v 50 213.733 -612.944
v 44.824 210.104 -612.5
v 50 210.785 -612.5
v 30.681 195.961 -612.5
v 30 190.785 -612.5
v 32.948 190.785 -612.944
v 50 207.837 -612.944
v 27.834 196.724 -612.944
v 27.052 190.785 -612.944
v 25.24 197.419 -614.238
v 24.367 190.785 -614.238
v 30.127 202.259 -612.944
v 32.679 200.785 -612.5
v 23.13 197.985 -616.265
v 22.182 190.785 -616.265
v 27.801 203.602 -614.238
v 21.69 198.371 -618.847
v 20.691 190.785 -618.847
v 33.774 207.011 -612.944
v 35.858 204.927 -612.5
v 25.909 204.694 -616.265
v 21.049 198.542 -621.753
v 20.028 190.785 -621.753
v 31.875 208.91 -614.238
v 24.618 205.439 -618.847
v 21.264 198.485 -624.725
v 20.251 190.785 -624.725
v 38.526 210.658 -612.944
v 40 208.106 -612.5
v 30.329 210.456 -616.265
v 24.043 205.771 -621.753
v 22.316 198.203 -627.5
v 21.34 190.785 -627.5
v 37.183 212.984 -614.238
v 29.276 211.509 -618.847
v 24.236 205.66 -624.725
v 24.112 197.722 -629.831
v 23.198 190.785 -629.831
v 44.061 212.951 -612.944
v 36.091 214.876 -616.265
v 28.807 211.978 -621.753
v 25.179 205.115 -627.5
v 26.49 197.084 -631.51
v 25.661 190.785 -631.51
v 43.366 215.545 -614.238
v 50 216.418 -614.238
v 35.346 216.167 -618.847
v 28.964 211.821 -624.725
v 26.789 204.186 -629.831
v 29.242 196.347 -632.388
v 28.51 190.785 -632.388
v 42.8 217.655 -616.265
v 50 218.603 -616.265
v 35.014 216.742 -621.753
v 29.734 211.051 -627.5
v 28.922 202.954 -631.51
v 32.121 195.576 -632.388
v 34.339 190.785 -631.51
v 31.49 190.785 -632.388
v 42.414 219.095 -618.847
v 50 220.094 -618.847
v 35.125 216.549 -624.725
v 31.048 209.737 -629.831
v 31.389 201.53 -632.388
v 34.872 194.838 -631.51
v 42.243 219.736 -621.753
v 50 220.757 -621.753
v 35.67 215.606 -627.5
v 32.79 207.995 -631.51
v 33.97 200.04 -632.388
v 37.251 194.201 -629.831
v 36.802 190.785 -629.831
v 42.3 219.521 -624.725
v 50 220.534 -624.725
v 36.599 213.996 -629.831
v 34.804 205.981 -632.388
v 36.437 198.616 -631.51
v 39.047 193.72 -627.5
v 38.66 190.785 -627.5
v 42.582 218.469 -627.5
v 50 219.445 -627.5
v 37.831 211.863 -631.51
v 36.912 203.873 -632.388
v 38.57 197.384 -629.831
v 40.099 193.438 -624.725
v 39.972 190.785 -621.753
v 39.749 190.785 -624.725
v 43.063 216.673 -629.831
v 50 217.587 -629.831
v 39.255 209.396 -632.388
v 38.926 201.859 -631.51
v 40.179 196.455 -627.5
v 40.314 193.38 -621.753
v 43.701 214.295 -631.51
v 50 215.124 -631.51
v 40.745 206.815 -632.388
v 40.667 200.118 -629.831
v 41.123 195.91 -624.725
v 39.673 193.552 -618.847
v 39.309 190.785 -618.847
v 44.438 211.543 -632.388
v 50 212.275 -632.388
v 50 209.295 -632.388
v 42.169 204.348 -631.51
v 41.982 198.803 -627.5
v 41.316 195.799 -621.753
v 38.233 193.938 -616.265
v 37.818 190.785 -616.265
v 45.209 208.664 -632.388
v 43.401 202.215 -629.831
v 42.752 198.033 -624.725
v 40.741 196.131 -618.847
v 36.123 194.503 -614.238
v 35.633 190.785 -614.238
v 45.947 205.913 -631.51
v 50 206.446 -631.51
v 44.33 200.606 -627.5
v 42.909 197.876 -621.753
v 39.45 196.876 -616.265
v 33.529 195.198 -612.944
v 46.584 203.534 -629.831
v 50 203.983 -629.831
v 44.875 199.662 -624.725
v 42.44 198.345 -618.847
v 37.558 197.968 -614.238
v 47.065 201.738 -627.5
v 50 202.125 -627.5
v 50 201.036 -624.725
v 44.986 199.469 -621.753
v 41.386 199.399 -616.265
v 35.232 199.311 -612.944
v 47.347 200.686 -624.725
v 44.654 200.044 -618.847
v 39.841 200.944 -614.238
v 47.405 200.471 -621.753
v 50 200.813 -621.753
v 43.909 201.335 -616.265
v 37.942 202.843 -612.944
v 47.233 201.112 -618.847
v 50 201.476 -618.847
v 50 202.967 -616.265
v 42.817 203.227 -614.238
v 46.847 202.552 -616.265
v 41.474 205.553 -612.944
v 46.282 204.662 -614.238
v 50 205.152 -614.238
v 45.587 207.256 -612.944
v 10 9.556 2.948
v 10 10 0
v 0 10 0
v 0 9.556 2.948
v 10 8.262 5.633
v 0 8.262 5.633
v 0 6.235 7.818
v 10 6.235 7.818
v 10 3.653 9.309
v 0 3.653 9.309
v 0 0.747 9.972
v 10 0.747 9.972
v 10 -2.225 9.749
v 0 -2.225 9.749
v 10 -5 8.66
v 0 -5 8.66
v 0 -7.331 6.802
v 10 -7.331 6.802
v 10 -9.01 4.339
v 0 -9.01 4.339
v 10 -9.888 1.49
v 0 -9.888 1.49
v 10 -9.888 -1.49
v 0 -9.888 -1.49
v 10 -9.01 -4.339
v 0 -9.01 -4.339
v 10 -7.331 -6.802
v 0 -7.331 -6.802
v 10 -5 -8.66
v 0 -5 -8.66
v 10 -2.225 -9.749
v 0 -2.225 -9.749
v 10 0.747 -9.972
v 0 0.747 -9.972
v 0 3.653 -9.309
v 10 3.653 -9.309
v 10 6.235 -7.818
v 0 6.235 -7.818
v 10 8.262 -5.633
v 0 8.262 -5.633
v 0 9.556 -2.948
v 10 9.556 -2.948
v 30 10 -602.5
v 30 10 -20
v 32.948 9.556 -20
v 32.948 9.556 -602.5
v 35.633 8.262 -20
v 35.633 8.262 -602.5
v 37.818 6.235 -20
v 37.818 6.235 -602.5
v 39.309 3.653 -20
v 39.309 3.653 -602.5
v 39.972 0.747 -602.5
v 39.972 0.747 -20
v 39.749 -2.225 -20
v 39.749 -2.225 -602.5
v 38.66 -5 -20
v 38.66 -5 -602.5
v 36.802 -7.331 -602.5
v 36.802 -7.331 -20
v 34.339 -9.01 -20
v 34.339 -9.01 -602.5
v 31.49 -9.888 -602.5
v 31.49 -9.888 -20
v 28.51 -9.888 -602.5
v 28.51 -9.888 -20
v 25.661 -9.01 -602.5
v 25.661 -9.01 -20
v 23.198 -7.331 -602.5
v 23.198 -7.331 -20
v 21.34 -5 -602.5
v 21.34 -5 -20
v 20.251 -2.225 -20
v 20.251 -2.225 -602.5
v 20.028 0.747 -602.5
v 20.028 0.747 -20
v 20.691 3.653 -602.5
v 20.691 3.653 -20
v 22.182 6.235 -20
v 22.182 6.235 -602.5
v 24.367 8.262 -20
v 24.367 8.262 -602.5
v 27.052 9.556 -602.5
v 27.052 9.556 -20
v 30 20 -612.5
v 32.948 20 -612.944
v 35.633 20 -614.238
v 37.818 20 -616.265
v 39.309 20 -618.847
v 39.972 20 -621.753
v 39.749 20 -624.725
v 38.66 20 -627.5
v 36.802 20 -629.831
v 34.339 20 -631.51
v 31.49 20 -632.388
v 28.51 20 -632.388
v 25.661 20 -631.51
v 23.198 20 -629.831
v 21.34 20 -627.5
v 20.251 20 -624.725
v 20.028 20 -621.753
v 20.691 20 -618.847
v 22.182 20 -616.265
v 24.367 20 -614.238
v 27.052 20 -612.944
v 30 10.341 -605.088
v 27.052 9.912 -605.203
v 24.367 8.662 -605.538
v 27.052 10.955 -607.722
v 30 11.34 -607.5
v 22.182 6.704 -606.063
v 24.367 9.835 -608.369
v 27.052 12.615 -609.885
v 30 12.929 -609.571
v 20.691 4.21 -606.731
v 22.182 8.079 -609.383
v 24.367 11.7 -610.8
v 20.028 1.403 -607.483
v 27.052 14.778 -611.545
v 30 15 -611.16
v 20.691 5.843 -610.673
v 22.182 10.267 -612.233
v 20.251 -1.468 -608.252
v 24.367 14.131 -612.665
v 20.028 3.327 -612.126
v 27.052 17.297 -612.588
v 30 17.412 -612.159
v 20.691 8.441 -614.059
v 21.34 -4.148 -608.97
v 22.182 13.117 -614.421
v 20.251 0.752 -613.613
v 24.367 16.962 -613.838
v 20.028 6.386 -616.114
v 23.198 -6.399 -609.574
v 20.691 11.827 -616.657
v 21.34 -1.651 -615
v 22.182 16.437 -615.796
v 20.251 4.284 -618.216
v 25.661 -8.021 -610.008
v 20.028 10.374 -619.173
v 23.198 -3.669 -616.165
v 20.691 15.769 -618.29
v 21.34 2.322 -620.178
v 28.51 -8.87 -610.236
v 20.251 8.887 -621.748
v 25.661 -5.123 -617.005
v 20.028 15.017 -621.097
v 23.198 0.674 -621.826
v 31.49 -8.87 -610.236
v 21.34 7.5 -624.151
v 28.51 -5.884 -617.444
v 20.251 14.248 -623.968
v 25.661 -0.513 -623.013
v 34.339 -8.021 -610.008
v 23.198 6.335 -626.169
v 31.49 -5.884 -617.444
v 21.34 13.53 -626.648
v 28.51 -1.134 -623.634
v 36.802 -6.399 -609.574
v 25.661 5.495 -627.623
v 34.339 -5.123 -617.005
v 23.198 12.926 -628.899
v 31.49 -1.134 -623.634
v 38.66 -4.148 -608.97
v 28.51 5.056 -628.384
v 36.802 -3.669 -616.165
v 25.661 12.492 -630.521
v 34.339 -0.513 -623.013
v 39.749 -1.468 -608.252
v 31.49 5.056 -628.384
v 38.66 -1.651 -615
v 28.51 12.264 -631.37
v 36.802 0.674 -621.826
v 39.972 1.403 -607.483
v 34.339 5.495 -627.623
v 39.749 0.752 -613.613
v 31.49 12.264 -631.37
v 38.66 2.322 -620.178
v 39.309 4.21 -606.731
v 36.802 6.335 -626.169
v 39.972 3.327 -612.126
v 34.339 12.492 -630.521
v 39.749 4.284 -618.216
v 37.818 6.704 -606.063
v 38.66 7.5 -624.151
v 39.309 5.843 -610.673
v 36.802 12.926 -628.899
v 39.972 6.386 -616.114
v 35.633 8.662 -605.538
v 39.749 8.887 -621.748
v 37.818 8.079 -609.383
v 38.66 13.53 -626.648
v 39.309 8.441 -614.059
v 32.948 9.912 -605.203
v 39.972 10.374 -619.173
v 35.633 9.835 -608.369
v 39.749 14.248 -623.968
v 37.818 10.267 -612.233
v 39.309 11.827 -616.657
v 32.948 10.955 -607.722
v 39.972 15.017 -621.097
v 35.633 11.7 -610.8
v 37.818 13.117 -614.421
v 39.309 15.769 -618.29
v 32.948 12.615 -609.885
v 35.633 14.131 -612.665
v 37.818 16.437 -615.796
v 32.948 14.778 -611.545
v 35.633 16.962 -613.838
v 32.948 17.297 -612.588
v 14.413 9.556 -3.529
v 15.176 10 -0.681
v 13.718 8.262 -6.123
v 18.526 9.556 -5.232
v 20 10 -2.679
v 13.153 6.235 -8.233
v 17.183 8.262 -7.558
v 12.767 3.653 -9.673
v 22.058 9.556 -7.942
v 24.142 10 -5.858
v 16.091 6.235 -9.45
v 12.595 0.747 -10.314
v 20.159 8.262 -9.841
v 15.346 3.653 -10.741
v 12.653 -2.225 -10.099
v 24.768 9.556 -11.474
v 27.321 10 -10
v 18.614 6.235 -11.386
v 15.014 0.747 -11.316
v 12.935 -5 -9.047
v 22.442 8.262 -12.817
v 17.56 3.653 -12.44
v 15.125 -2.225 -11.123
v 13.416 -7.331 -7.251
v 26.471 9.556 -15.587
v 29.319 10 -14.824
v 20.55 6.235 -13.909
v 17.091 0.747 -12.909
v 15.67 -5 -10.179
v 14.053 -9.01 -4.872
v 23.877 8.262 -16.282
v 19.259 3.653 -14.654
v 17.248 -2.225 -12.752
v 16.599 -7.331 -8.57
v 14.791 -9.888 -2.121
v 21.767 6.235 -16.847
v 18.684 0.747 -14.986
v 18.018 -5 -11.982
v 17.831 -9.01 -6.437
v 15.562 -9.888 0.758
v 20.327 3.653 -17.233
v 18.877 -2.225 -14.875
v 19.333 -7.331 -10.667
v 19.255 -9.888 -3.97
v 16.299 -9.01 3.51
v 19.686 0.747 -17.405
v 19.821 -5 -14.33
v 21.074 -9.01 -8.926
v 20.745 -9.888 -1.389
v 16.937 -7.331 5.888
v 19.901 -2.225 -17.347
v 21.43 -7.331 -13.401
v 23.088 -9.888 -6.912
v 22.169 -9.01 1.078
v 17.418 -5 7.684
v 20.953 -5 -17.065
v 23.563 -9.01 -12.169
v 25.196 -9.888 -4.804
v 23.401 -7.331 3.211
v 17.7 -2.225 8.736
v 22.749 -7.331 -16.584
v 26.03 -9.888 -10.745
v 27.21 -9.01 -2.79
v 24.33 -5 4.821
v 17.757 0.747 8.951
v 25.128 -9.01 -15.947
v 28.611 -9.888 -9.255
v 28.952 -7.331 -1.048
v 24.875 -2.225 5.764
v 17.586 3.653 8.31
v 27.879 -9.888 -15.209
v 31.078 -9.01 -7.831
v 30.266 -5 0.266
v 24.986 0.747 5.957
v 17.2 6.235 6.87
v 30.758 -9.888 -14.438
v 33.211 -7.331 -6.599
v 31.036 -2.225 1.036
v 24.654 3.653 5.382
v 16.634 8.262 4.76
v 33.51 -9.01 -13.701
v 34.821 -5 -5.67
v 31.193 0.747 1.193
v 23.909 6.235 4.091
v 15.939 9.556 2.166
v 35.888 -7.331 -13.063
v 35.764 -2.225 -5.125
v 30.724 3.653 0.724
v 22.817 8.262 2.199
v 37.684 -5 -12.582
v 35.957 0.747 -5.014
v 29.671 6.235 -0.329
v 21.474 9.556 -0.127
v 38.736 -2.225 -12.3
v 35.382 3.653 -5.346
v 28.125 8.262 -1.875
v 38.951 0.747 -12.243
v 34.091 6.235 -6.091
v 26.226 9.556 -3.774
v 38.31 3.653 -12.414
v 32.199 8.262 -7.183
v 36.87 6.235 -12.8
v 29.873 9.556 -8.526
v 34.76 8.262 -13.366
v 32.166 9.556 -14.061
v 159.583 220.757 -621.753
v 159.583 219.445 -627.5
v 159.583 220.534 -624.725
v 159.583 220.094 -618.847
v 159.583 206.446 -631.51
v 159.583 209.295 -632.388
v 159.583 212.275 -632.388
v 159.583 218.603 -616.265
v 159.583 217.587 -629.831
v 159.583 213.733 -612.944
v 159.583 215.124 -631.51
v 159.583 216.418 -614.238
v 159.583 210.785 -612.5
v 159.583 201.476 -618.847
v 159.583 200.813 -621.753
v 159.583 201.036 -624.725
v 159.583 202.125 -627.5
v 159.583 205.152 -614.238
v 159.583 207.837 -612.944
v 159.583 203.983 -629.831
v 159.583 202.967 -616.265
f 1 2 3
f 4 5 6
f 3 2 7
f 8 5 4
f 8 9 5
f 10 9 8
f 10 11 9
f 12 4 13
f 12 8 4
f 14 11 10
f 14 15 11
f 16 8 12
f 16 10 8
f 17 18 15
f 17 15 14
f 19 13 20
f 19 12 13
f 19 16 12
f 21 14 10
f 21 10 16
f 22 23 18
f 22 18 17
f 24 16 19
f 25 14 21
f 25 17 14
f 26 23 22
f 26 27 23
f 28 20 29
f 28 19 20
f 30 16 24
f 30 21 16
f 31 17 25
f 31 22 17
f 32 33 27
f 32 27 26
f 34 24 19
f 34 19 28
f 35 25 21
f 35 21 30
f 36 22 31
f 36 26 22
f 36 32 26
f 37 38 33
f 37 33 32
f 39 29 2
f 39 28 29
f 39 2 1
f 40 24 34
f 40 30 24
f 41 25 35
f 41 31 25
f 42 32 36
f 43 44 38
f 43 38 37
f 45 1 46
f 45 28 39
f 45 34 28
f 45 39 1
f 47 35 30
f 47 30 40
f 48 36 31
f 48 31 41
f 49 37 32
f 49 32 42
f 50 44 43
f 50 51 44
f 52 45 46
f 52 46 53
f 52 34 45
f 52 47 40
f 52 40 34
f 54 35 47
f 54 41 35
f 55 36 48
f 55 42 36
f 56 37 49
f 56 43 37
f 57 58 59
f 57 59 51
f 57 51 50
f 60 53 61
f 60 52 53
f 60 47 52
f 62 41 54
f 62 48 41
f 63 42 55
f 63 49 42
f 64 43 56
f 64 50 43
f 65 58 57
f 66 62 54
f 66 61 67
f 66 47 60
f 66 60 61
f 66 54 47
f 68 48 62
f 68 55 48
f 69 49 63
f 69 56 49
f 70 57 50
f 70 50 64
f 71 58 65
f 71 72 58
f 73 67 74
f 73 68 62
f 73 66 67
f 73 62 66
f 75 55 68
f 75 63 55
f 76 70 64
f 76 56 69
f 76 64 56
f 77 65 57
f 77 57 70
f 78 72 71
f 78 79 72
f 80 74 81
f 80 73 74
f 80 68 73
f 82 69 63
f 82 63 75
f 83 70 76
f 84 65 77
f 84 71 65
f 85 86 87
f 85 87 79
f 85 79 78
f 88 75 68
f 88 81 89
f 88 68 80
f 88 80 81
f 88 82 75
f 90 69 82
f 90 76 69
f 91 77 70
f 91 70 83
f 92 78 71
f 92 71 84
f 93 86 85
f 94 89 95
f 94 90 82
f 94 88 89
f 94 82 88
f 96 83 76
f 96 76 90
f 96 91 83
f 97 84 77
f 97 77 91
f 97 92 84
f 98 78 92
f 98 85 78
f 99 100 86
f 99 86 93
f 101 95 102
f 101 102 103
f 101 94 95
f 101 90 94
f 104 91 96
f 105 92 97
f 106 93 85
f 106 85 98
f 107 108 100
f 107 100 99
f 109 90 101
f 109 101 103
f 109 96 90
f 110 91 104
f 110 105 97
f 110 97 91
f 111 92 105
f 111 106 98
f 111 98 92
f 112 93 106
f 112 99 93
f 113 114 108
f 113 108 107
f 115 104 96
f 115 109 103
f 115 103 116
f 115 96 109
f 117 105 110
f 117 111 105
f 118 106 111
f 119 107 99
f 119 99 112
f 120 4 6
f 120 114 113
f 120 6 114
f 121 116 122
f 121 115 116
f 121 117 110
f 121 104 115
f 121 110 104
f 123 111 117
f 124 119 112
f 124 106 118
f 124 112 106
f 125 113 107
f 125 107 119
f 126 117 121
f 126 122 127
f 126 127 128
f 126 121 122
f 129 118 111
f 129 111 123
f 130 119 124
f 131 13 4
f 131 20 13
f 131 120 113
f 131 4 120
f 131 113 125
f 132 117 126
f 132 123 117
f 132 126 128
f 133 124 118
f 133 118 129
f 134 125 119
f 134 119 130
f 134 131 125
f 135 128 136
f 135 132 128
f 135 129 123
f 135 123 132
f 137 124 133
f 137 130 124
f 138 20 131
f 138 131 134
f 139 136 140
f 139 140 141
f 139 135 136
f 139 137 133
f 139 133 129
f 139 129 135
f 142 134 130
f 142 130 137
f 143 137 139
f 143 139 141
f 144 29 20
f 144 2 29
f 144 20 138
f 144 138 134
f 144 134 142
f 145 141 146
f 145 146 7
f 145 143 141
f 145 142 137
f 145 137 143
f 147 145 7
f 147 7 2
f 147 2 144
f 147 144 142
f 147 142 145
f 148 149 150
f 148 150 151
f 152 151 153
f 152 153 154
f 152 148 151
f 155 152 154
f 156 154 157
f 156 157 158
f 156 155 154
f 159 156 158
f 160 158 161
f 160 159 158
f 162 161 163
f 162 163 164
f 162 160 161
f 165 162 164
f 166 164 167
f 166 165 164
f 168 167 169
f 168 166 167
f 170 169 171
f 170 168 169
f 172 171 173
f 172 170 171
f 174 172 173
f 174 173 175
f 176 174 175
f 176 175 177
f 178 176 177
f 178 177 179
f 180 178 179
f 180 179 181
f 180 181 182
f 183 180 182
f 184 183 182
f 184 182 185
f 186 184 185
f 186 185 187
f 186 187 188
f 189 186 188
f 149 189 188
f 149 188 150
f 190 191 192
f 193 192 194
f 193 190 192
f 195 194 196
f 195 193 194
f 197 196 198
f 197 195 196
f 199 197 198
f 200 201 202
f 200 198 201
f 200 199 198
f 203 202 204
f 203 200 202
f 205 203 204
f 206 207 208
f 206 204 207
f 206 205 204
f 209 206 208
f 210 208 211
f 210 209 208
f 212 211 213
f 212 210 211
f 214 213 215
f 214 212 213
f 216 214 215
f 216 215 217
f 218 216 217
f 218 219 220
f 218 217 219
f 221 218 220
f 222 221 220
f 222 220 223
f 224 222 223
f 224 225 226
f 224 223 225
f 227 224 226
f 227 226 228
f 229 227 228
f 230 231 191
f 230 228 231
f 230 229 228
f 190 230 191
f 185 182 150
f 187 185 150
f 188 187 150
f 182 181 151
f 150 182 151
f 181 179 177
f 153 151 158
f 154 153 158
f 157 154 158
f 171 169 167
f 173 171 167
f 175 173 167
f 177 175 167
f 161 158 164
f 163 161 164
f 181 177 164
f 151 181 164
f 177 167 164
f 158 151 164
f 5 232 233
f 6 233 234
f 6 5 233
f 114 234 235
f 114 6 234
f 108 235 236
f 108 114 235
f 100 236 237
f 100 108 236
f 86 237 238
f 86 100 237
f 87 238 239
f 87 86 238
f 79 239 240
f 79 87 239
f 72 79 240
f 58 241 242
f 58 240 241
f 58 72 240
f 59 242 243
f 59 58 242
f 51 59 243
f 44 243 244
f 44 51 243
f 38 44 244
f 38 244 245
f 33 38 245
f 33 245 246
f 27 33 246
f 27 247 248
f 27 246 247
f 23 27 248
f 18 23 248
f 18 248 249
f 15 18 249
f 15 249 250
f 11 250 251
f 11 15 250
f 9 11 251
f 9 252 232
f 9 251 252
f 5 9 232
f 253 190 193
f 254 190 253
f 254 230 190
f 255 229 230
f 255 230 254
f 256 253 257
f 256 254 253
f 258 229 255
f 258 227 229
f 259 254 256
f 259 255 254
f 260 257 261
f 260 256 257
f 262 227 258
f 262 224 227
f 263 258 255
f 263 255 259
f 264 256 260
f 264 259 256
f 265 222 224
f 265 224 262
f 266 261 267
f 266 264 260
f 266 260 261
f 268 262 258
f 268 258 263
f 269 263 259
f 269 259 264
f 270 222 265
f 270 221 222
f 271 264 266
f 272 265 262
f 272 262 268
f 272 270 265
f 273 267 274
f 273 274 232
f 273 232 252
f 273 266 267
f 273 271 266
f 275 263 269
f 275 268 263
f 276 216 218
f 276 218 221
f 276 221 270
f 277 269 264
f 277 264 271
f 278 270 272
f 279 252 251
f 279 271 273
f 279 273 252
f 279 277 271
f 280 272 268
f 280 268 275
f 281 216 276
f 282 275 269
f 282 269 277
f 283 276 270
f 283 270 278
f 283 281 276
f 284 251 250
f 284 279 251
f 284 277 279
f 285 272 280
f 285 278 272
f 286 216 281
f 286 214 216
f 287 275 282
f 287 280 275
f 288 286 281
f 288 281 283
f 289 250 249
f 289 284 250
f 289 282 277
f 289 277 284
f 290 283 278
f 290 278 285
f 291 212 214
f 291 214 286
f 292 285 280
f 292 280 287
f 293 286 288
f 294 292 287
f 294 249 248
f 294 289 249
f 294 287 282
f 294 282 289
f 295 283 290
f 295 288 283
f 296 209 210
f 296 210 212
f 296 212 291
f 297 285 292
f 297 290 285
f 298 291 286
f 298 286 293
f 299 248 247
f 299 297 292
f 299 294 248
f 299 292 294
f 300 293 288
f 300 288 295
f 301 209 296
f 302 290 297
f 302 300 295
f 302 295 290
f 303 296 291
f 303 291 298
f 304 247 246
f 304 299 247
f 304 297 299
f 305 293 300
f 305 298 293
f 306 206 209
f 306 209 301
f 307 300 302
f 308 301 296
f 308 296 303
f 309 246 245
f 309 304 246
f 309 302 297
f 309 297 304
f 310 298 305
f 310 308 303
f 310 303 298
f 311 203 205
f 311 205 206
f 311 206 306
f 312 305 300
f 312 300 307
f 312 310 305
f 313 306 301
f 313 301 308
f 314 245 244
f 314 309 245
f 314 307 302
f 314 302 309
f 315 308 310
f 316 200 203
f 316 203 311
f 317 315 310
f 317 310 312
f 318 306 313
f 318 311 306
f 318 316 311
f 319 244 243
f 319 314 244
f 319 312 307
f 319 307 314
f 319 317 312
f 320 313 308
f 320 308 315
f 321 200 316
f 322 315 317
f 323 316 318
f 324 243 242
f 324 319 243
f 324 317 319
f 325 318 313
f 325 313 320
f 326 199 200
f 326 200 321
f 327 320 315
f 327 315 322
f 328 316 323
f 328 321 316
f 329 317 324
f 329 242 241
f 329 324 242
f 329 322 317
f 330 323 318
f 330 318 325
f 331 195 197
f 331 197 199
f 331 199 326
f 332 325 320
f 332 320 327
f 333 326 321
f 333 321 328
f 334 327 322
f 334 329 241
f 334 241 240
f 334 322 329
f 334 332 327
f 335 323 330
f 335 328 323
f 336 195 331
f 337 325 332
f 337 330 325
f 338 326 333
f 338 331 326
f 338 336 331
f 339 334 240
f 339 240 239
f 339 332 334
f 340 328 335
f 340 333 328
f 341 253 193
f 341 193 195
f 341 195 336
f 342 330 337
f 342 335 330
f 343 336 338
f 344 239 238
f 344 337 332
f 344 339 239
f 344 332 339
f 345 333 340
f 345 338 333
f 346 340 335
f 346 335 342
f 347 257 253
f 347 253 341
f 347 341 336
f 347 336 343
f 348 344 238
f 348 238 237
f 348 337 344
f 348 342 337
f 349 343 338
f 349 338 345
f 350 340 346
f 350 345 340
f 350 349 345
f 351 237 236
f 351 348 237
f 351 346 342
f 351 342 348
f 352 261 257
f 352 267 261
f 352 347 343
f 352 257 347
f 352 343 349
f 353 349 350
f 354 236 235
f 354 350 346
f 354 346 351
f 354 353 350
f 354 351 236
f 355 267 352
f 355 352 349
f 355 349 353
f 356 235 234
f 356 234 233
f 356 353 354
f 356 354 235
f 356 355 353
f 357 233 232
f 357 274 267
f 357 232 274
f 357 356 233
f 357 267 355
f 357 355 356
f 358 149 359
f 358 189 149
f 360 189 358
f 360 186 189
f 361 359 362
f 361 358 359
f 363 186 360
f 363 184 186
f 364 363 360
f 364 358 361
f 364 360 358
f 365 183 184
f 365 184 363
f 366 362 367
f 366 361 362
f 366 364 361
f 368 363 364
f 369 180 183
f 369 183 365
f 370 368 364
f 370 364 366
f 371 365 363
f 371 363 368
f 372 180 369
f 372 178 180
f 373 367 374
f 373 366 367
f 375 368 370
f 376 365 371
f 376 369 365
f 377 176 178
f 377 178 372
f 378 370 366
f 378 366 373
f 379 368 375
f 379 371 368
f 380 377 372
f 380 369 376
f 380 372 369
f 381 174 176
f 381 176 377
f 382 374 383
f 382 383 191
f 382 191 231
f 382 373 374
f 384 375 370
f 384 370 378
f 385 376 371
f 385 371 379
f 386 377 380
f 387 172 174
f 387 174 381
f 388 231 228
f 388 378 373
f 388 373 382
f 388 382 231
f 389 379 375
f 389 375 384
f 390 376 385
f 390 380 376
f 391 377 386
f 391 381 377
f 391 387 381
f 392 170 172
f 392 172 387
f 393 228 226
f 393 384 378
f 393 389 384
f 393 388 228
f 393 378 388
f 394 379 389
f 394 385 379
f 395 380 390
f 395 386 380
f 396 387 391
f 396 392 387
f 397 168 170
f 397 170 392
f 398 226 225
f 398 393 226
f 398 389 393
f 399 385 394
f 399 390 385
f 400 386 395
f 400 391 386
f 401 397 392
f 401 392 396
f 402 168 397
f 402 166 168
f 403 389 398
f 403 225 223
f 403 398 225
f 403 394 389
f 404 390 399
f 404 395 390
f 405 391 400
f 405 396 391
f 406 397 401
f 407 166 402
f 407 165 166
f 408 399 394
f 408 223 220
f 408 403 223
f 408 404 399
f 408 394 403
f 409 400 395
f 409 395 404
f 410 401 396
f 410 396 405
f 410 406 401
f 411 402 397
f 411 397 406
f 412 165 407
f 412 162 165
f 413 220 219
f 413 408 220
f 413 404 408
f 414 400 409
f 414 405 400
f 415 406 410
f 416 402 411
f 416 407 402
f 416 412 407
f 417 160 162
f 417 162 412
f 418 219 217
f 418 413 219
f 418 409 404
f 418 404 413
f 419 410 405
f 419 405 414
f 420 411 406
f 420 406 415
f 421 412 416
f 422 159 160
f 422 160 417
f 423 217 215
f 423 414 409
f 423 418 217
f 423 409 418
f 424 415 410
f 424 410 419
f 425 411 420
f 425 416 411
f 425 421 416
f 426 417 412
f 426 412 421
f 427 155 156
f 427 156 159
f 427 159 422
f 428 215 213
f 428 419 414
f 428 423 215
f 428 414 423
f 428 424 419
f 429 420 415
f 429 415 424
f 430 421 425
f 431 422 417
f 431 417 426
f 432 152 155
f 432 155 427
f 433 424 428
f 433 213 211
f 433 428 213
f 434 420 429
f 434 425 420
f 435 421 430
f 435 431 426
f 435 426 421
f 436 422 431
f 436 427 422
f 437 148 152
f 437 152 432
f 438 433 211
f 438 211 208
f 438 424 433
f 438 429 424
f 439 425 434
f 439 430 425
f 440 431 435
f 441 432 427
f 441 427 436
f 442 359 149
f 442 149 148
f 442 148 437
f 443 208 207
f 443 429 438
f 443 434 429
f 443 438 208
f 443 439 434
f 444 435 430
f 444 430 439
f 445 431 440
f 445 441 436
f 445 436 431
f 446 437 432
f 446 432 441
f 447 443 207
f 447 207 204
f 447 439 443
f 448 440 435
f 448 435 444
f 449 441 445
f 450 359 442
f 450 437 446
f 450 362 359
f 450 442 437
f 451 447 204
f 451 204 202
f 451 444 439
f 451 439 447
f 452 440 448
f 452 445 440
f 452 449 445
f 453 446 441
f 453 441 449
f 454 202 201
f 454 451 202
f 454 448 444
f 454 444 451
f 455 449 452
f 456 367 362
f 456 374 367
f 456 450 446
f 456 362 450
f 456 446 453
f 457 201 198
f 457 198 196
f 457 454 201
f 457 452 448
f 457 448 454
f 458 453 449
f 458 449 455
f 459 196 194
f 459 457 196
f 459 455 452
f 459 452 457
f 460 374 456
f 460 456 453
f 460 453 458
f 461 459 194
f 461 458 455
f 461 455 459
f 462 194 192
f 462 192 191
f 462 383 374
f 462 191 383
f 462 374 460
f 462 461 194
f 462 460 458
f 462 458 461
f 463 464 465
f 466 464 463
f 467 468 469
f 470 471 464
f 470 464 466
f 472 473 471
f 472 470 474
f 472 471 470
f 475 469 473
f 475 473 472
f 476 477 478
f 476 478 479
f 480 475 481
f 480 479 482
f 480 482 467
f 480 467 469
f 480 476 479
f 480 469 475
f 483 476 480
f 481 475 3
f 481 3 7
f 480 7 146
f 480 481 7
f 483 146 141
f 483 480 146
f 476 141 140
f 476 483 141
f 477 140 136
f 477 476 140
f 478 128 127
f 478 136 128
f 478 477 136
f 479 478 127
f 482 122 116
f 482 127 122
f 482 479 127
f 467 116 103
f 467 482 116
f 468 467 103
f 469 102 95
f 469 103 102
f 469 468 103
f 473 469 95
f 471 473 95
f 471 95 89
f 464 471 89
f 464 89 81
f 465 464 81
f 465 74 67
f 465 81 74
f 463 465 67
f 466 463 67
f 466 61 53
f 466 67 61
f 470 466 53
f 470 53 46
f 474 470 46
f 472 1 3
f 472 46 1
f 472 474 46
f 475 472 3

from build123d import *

# Parameters (mm, degrees)
F5_R = 10


with BuildPart() as f6:
    # F6: sweep along a path in F0, F4, F2
    with BuildLine(Plane.XZ) as f6_path:
        Line((0, 0), (10, 0))
        ThreePointArc((10, 0), (24.1421356237, -5.8578643763), (30, -20))
        Line((30, -20), (30, -602.5))
    with BuildLine(Plane.YZ.offset(30)) as f6_path_2:
        ThreePointArc((0, -602.5), (5.8578643763, -616.6421356237), (20, -622.5))
    with BuildLine(Plane.XY.offset(-622.5)) as f6_path_3:
        Line((30, 20), (30, 190.785))
        ThreePointArc((30, 190.785), (35.8578643763, 204.9271356237), (50, 210.785))
        Line((50, 210.785), (159.583, 210.785))
    # F5 (on Right) → F6 (sweep)
    with BuildSketch(Plane.YZ):
        Circle(F5_R)
    sweep(path=f6_path.line + f6_path_2.line + f6_path_3.line)


solid = f6.part
